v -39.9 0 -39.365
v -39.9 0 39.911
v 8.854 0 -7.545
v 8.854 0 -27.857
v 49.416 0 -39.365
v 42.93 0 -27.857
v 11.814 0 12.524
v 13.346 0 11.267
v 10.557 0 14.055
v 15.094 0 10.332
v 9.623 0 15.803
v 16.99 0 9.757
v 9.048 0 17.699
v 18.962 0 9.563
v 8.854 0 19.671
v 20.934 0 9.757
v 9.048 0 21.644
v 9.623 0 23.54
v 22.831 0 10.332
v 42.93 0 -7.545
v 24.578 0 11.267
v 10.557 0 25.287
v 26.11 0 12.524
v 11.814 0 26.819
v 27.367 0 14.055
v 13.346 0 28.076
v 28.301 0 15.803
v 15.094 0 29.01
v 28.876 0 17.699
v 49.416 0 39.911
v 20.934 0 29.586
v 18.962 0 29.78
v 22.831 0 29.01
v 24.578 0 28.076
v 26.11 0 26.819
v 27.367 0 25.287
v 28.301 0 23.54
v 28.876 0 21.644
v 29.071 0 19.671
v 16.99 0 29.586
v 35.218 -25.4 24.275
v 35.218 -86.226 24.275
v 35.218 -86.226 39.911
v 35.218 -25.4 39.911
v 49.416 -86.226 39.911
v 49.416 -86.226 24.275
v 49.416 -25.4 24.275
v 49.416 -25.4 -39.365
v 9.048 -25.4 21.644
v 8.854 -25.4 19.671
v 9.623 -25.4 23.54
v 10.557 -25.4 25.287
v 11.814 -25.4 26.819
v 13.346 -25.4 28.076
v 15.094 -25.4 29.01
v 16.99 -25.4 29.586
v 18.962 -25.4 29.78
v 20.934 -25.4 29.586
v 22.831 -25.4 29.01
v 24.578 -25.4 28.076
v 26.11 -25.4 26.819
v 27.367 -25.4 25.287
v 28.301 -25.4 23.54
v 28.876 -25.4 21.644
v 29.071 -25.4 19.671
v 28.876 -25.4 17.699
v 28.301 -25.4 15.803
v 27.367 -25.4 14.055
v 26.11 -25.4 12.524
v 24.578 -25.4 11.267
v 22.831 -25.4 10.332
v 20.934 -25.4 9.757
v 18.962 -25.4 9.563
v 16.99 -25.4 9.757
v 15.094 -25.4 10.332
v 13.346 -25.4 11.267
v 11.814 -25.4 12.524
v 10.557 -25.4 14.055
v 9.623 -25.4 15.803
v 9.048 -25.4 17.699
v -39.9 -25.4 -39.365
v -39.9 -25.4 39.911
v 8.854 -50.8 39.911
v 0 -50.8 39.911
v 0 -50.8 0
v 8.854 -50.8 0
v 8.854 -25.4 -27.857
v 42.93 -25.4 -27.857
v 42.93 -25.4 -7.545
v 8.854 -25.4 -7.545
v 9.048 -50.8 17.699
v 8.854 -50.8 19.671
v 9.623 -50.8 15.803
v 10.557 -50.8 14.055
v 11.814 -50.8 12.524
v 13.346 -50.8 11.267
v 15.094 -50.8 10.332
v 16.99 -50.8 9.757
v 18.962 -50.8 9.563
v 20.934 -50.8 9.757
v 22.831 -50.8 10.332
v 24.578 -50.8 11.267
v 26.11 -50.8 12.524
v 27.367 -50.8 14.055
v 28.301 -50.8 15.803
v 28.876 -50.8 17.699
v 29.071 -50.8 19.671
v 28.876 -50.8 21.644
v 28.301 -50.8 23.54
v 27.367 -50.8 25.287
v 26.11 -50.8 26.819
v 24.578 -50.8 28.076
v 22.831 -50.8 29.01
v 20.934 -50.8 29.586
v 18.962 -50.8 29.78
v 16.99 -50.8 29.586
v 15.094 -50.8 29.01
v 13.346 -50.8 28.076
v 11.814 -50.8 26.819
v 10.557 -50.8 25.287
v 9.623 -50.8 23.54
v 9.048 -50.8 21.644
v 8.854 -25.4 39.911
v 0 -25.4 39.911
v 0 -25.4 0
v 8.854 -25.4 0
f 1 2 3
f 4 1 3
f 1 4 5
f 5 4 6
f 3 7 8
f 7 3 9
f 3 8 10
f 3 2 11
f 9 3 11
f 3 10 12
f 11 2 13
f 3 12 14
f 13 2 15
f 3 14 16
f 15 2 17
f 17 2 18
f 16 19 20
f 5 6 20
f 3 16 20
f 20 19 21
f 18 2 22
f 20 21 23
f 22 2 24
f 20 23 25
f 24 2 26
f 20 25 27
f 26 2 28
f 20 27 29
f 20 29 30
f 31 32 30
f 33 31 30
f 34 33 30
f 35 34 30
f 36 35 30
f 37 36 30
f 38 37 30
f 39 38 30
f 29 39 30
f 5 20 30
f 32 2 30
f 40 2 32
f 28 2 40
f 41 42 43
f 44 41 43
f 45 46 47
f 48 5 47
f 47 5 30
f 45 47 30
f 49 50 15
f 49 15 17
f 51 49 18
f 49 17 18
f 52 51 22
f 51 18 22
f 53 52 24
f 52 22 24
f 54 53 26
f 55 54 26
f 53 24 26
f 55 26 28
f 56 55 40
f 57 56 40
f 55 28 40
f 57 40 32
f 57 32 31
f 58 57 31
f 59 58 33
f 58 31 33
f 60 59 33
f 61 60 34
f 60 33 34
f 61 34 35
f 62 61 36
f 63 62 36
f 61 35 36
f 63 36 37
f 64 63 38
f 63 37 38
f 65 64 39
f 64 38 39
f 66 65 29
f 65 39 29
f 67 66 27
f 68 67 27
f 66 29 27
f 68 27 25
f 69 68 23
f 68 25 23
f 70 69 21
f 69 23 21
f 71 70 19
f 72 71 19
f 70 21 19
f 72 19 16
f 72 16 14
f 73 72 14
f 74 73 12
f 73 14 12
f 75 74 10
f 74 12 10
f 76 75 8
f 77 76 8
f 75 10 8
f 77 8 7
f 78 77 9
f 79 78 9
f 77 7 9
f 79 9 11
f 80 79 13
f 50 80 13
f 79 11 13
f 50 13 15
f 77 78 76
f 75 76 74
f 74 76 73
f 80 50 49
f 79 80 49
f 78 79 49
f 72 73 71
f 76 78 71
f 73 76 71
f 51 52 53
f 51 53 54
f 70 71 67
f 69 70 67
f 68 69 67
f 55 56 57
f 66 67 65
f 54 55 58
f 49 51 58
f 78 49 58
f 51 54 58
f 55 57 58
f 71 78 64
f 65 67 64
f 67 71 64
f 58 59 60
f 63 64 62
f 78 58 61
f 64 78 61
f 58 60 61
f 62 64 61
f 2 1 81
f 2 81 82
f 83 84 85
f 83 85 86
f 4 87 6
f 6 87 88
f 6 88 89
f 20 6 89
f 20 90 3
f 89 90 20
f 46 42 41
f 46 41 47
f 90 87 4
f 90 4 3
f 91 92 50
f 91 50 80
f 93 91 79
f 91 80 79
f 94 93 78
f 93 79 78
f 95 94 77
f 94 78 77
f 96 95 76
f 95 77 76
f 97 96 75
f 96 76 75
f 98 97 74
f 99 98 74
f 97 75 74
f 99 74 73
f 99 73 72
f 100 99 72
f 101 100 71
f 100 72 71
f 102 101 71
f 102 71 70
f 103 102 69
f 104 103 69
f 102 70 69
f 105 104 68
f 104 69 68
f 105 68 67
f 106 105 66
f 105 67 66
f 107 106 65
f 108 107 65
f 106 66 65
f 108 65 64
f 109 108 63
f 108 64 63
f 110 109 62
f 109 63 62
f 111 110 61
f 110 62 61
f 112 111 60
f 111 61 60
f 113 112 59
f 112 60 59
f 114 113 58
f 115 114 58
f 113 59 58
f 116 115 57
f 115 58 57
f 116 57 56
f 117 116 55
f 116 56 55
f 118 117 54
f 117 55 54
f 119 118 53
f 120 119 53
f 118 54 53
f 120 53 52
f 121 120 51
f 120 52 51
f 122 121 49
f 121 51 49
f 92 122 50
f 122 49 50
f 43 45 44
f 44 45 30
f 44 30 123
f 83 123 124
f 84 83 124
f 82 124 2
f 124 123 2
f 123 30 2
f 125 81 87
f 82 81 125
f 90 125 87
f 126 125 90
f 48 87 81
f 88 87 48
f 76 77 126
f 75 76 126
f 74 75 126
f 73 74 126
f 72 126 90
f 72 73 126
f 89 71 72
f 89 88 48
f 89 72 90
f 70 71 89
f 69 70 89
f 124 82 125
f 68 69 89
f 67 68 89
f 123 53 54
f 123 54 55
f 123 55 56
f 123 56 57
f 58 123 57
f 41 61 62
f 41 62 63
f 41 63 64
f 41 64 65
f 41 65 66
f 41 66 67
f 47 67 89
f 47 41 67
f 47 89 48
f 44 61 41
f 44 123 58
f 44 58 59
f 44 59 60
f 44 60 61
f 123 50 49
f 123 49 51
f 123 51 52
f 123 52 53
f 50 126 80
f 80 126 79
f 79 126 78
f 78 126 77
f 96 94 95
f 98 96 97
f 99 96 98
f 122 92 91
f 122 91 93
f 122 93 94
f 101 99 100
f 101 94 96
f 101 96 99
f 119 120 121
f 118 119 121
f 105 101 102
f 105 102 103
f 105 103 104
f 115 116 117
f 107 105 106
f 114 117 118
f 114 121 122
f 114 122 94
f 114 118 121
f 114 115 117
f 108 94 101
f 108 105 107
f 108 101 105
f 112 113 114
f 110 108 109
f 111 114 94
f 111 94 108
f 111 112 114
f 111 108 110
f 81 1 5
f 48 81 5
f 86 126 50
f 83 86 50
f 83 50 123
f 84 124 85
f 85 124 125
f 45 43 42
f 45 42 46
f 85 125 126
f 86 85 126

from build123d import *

# Parameters (mm, degrees)
F0_W     = 89.3156863749
F0_H     = 79.2764052749
F1_DEPTH = 25.4
F2_W     = 14.1974128783
F2_H     = 15.6361199915
F3_DEPTH = 60.8264654875
F4_W     = 34.0766403824
F4_H     = 20.3113891184
F5_DEPTH = 25.4
F6_R     = 10.1085053757
F7_DEPTH = 25.4
F9_DEPTH = 25.4


with BuildPart() as f1:
    # F0 (on Front) → F1 (new body)
    with BuildSketch(Plane.XZ):
        with Locations((4.7579761595, 0.2727396786)):
            Rectangle(F0_W, F0_H)
    extrude(amount=F1_DEPTH)

    # F2 (on face) → F3 (join)
    with BuildSketch(Plane.XZ.offset(25.4)):
        with Locations((42.3171129078, 32.0928823203)):
            Rectangle(F2_W, F2_H)
    extrude(amount=F3_DEPTH)

    # F4 (on face) → F5 (cut)
    with BuildSketch(Plane.XZ.offset(25.4)):
        with Locations((25.8919894695, -17.7010148764)):
            Rectangle(F4_W, F4_H)
    extrude(amount=-F5_DEPTH, mode=Mode.SUBTRACT)

    # F6 (on face) → F7 (cut)
    with BuildSketch(Plane(origin=(0, 0, 0), x_dir=(-1, 0, 0), z_dir=(0, 1, 0))):
        with Locations((-18.962174654, 19.6714401245)):
            Circle(F6_R)
    extrude(amount=-F7_DEPTH, mode=Mode.SUBTRACT)

    # F8 (on face) → F9 (join)
    with BuildSketch(Plane.XZ.offset(25.4)):
        Polygon((8.8536692783, 19.6714401245), (8.8536692783, 39.9109423161), (0, 39.9109423161), (0, 0), (8.8536692783, 0), align=None)
    extrude(amount=F9_DEPTH)


with BuildPart() as f9:
    # F8 (on face) → F9, piece 2 (new body)
    with BuildSketch(Plane.XZ.offset(25.4)):
        with BuildLine():
            ThreePointArc((29.0706800297, 19.6714401245), (18.962174654, 29.7799455002), (8.8536692783, 19.6714401245))
            ThreePointArc((8.8536692783, 19.6714401245), (18.962174654, 9.5629347488), (29.0706800297, 19.6714401245))
        make_face()
    extrude(amount=F9_DEPTH)


solid = Compound([f1.part, f9.part])
